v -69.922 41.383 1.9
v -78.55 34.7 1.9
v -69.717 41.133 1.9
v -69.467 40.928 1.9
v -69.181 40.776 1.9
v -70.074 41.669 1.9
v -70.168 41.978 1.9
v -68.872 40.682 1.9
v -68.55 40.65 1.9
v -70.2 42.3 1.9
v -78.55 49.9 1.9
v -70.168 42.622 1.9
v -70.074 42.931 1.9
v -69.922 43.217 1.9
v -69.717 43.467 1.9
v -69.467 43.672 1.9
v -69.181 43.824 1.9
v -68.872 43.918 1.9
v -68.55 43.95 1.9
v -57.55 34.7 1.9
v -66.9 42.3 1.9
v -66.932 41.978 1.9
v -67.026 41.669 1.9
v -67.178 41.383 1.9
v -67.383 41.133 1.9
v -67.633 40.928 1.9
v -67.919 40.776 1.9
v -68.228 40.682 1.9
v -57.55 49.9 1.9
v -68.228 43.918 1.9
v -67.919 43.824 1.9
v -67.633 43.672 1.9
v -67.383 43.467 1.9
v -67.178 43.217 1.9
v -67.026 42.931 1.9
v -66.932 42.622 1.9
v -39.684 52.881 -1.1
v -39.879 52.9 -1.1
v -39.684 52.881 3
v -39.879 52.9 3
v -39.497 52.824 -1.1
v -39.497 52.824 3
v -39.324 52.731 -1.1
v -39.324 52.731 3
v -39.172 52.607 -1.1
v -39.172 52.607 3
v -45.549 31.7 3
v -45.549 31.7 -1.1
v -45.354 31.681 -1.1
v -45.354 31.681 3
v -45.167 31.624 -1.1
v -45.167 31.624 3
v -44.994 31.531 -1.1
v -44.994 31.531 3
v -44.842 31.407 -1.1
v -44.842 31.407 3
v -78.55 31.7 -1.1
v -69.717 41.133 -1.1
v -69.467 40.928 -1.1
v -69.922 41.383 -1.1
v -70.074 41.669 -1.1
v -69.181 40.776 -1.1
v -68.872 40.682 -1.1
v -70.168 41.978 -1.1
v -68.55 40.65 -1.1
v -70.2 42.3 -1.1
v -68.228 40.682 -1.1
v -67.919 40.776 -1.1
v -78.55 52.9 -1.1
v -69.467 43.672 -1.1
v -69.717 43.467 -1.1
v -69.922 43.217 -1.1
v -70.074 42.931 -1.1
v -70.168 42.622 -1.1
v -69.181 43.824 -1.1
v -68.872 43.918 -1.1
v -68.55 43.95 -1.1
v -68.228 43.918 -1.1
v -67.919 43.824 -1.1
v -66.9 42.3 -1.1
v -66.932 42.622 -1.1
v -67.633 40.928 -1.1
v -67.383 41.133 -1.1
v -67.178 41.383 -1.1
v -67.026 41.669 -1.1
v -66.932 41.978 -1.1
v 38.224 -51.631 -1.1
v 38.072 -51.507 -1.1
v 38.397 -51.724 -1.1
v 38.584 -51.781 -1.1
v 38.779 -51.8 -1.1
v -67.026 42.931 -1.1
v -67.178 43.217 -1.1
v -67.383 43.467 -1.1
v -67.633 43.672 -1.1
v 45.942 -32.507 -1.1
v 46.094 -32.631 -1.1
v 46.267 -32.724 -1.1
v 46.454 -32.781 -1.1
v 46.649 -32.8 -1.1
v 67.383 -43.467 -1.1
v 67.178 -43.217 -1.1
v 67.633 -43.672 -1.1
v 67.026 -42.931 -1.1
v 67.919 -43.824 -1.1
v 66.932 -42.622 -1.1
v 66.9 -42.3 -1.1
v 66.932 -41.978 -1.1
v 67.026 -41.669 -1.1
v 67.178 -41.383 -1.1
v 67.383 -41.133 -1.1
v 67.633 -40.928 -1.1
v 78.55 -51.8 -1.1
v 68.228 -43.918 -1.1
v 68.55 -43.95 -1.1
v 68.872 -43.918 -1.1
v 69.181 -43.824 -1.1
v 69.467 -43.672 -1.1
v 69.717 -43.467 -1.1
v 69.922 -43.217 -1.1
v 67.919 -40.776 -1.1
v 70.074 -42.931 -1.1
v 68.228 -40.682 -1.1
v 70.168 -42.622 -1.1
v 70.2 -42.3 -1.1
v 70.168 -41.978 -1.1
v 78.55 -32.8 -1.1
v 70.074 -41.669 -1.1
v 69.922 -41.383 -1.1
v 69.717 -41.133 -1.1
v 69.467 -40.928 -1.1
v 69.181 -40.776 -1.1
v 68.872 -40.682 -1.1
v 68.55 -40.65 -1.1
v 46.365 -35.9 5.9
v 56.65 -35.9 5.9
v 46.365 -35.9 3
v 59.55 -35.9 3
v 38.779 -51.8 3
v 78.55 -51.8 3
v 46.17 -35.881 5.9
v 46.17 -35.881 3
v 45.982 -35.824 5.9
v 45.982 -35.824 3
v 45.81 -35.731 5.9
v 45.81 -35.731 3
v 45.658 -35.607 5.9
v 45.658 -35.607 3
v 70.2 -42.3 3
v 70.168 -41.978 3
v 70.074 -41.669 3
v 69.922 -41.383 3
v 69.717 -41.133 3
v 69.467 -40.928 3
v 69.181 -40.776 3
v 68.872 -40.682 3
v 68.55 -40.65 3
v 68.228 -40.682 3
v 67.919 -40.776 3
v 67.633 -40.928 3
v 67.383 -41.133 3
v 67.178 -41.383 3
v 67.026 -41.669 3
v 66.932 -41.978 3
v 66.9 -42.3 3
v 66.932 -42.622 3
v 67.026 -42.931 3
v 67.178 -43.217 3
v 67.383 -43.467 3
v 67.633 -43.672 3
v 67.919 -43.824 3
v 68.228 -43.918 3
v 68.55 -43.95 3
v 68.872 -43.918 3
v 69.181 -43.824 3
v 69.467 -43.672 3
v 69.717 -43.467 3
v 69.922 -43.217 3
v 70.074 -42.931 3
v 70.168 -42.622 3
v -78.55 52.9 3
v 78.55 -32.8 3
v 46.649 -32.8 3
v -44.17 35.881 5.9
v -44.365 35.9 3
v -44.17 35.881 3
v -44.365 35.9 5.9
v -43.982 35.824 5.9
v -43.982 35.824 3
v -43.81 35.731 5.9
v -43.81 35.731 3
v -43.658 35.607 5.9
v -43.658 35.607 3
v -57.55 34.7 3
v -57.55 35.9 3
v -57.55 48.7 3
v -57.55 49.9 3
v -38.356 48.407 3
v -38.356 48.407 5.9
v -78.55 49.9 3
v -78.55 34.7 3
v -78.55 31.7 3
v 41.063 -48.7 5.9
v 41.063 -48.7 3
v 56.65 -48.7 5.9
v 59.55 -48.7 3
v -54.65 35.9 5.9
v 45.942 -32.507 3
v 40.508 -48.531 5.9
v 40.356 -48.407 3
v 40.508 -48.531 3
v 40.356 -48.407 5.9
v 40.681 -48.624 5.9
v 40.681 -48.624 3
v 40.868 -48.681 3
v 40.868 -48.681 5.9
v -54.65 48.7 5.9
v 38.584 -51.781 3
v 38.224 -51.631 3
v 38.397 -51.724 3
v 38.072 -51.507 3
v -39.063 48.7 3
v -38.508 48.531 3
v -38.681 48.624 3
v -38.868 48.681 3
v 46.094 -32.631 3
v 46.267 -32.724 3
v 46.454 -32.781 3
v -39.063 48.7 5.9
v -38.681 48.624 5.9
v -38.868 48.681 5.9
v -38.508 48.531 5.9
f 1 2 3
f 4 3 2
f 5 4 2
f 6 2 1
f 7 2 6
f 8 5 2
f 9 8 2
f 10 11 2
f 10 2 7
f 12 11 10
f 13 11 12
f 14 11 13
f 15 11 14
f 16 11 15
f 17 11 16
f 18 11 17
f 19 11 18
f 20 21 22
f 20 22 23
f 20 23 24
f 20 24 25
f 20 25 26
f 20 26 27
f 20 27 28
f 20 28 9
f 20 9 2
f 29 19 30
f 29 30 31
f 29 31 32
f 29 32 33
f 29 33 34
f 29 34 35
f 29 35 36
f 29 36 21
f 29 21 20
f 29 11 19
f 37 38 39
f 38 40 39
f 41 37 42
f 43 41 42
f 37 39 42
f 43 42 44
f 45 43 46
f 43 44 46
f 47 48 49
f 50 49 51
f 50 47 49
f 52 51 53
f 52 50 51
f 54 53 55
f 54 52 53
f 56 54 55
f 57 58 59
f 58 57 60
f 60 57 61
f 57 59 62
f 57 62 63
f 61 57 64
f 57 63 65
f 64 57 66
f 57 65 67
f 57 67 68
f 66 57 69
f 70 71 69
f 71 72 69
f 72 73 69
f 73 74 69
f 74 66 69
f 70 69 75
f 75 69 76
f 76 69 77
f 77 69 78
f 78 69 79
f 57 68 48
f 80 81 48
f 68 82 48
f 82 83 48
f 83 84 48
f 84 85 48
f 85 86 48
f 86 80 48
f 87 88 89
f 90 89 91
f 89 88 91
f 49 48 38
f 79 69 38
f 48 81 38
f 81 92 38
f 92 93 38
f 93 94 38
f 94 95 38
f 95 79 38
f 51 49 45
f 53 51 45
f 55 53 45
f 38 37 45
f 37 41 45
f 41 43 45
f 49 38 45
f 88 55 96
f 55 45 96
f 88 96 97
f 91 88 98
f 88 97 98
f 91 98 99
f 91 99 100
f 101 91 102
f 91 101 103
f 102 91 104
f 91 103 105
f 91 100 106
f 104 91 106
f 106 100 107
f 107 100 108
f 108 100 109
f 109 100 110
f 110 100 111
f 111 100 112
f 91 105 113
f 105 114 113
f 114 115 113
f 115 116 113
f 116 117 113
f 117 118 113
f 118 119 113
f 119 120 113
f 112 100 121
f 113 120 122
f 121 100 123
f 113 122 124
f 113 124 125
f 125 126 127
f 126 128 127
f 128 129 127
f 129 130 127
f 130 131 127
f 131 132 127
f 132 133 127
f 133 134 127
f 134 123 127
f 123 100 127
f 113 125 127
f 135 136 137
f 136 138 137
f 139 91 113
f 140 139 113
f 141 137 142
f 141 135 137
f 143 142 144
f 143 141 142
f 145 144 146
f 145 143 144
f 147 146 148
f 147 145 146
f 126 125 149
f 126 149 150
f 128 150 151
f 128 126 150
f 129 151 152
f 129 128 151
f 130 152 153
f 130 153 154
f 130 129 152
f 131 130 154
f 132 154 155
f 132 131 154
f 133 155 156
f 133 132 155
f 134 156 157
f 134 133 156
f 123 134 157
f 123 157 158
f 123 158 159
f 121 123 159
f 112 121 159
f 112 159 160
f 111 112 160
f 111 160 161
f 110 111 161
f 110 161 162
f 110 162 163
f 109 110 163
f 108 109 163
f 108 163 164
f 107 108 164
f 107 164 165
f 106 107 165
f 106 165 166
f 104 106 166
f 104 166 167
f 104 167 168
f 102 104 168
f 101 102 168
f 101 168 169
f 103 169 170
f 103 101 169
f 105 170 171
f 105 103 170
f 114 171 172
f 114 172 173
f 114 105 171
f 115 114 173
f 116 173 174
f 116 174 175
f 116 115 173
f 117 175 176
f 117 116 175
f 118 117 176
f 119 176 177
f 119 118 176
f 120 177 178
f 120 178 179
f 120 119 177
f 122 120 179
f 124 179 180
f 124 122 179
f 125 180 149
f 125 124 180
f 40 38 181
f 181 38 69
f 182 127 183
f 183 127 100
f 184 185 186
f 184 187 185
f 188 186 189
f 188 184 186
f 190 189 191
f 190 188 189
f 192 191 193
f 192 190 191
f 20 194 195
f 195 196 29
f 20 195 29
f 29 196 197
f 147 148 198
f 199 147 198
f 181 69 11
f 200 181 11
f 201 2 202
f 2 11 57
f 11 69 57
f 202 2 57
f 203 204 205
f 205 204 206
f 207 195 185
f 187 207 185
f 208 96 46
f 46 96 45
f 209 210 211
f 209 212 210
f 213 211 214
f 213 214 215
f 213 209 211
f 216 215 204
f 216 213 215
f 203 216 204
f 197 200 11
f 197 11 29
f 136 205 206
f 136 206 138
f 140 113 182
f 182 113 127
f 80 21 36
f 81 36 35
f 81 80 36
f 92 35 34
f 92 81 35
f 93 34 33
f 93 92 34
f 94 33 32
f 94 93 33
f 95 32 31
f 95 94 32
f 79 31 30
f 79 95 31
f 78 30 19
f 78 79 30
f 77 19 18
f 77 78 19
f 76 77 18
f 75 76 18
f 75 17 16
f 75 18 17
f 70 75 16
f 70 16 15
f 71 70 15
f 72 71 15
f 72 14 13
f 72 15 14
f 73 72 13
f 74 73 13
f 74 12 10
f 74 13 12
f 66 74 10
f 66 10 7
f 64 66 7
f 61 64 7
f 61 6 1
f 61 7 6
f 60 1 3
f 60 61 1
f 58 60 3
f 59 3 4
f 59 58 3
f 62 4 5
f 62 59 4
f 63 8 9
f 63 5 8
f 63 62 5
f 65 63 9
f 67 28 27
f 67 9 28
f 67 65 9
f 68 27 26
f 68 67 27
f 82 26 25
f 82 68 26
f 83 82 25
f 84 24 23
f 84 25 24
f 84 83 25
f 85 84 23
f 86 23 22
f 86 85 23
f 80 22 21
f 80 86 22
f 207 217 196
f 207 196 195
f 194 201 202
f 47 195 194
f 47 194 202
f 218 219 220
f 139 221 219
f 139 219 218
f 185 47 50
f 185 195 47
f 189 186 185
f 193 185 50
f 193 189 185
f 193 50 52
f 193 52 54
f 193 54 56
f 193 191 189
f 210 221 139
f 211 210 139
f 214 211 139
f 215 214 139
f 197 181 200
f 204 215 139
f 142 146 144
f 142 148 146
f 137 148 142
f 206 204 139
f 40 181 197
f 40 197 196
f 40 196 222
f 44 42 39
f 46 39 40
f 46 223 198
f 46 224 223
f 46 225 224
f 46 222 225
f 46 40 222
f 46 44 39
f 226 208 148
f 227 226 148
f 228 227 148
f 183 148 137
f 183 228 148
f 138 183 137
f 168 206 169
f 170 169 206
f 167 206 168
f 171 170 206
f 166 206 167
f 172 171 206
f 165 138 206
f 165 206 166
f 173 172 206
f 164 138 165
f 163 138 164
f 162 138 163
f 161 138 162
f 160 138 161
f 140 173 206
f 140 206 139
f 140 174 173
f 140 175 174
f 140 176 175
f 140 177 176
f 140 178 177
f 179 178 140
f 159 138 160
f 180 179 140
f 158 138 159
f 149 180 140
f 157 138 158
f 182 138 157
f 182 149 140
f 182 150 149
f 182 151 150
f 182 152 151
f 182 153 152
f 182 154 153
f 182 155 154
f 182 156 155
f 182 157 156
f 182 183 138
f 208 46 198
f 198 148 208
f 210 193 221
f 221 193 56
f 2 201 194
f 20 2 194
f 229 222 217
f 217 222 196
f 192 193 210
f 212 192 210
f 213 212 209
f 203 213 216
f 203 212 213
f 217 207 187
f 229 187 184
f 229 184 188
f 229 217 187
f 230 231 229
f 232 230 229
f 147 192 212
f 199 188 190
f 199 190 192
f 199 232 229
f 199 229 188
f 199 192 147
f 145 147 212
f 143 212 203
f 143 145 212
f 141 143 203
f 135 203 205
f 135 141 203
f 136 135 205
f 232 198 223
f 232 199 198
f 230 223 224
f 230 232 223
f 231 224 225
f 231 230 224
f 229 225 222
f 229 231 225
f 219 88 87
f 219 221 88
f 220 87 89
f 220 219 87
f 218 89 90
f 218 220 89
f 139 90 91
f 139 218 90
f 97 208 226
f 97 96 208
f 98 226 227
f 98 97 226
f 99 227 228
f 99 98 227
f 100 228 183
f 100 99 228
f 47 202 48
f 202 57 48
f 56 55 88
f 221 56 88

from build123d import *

# Parameters (mm, degrees)
SKETCH_1_R          = 1.65
EXTRUDE_1_DEPTH     = 3
EXTRUDE_2_DEPTH     = 2.9
CHAMFER_1_SIZE      = 2.9
EXTRUDE_START       = -1.1
SKETCH_6_R          = 1.65
EXTRUDE_3_DEPTH     = 4.1
CUT_EXTRUDE_START   = 3
SKETCH_7_W          = 21
SKETCH_7_H          = 15.2
CUT_EXTRUDE_1_DEPTH = 1.1
FILLET_1_R          = 1


with BuildPart() as part:
    # 草图1 → 凸台-拉伸1 (new body)
    with BuildSketch(Plane.XY):
        Polygon((-78.55, 51.8), (-38.364971157, 51.8), (46.235028843, -32.8), (78.55, -32.8), (78.55, -51.8), (38.364971157, -51.8), (-46.235028843, 32.8), (-78.55, 32.8), align=None)
        with Locations((-68.55, 42.3)):
            Circle(SKETCH_1_R, mode=Mode.SUBTRACT)
        with Locations((68.55, -42.3)):
            Circle(SKETCH_1_R, mode=Mode.SUBTRACT)
    extrude(amount=EXTRUDE_1_DEPTH)

    # 草图2 → 凸台-拉伸2 (add)
    with BuildSketch(Plane.XY.offset(3)):
        Polygon((-57.55, 48.7), (-57.55, 35.9), (-43.950966799, 35.9), (40.649033201, -48.7), (59.55, -48.7), (59.55, -35.9), (45.950966799, -35.9), (-38.649033201, 48.7), align=None)
    extrude(amount=EXTRUDE_2_DEPTH)

    # 倒角1
    chamfer_1_edges = [part.edges().sort_by_distance(p)[0] for p in [
        (59.55, -42.3, 5.9),
        (-57.55, 42.3, 5.9),
    ]]
    chamfer(chamfer_1_edges, length=CHAMFER_1_SIZE - 0.0001)  # a hair under: the kernel refuses the full size

    # 草图6 → 凸台-拉伸3 (add)
    with BuildSketch(Plane.XY.offset(EXTRUDE_START)):
        Polygon((-78.55, 52.9), (-78.55, 31.7), (-45.135028843, 31.7), (38.364971157, -51.8), (78.55, -51.8), (78.55, -32.8), (46.235028843, -32.8), (-39.464971157, 52.9), align=None)
        with Locations((-68.55, 42.3)):
            Circle(SKETCH_6_R, mode=Mode.SUBTRACT)
        with Locations((68.55, -42.3)):
            Circle(SKETCH_6_R, mode=Mode.SUBTRACT)
    extrude(amount=EXTRUDE_3_DEPTH)

    # 草图7 → 切除-拉伸1 (cut)
    with BuildSketch(Plane.XY.offset(CUT_EXTRUDE_START)):
        with Locations((-68.05, 42.3)):
            Rectangle(SKETCH_7_W, SKETCH_7_H)
    extrude(amount=-CUT_EXTRUDE_1_DEPTH, mode=Mode.SUBTRACT)

    # 圆角1
    fillet_1_edges = [part.edges().sort_by_distance(p)[0] for p in [
        (46.235028843, -32.8, 0.95),
        (38.364971157, -51.8, 0.95),
        (-38.649033201, 48.7, 4.45),
        (-43.950966799, 35.9, 4.45),
        (40.649033201, -48.7, 4.45),
        (45.950966799, -35.9, 4.45),
        (-39.464971157, 52.9, 0.95),
        (-45.135028843, 31.7, 0.95),
    ]]
    fillet(fillet_1_edges, radius=FILLET_1_R)


solid = part.part
